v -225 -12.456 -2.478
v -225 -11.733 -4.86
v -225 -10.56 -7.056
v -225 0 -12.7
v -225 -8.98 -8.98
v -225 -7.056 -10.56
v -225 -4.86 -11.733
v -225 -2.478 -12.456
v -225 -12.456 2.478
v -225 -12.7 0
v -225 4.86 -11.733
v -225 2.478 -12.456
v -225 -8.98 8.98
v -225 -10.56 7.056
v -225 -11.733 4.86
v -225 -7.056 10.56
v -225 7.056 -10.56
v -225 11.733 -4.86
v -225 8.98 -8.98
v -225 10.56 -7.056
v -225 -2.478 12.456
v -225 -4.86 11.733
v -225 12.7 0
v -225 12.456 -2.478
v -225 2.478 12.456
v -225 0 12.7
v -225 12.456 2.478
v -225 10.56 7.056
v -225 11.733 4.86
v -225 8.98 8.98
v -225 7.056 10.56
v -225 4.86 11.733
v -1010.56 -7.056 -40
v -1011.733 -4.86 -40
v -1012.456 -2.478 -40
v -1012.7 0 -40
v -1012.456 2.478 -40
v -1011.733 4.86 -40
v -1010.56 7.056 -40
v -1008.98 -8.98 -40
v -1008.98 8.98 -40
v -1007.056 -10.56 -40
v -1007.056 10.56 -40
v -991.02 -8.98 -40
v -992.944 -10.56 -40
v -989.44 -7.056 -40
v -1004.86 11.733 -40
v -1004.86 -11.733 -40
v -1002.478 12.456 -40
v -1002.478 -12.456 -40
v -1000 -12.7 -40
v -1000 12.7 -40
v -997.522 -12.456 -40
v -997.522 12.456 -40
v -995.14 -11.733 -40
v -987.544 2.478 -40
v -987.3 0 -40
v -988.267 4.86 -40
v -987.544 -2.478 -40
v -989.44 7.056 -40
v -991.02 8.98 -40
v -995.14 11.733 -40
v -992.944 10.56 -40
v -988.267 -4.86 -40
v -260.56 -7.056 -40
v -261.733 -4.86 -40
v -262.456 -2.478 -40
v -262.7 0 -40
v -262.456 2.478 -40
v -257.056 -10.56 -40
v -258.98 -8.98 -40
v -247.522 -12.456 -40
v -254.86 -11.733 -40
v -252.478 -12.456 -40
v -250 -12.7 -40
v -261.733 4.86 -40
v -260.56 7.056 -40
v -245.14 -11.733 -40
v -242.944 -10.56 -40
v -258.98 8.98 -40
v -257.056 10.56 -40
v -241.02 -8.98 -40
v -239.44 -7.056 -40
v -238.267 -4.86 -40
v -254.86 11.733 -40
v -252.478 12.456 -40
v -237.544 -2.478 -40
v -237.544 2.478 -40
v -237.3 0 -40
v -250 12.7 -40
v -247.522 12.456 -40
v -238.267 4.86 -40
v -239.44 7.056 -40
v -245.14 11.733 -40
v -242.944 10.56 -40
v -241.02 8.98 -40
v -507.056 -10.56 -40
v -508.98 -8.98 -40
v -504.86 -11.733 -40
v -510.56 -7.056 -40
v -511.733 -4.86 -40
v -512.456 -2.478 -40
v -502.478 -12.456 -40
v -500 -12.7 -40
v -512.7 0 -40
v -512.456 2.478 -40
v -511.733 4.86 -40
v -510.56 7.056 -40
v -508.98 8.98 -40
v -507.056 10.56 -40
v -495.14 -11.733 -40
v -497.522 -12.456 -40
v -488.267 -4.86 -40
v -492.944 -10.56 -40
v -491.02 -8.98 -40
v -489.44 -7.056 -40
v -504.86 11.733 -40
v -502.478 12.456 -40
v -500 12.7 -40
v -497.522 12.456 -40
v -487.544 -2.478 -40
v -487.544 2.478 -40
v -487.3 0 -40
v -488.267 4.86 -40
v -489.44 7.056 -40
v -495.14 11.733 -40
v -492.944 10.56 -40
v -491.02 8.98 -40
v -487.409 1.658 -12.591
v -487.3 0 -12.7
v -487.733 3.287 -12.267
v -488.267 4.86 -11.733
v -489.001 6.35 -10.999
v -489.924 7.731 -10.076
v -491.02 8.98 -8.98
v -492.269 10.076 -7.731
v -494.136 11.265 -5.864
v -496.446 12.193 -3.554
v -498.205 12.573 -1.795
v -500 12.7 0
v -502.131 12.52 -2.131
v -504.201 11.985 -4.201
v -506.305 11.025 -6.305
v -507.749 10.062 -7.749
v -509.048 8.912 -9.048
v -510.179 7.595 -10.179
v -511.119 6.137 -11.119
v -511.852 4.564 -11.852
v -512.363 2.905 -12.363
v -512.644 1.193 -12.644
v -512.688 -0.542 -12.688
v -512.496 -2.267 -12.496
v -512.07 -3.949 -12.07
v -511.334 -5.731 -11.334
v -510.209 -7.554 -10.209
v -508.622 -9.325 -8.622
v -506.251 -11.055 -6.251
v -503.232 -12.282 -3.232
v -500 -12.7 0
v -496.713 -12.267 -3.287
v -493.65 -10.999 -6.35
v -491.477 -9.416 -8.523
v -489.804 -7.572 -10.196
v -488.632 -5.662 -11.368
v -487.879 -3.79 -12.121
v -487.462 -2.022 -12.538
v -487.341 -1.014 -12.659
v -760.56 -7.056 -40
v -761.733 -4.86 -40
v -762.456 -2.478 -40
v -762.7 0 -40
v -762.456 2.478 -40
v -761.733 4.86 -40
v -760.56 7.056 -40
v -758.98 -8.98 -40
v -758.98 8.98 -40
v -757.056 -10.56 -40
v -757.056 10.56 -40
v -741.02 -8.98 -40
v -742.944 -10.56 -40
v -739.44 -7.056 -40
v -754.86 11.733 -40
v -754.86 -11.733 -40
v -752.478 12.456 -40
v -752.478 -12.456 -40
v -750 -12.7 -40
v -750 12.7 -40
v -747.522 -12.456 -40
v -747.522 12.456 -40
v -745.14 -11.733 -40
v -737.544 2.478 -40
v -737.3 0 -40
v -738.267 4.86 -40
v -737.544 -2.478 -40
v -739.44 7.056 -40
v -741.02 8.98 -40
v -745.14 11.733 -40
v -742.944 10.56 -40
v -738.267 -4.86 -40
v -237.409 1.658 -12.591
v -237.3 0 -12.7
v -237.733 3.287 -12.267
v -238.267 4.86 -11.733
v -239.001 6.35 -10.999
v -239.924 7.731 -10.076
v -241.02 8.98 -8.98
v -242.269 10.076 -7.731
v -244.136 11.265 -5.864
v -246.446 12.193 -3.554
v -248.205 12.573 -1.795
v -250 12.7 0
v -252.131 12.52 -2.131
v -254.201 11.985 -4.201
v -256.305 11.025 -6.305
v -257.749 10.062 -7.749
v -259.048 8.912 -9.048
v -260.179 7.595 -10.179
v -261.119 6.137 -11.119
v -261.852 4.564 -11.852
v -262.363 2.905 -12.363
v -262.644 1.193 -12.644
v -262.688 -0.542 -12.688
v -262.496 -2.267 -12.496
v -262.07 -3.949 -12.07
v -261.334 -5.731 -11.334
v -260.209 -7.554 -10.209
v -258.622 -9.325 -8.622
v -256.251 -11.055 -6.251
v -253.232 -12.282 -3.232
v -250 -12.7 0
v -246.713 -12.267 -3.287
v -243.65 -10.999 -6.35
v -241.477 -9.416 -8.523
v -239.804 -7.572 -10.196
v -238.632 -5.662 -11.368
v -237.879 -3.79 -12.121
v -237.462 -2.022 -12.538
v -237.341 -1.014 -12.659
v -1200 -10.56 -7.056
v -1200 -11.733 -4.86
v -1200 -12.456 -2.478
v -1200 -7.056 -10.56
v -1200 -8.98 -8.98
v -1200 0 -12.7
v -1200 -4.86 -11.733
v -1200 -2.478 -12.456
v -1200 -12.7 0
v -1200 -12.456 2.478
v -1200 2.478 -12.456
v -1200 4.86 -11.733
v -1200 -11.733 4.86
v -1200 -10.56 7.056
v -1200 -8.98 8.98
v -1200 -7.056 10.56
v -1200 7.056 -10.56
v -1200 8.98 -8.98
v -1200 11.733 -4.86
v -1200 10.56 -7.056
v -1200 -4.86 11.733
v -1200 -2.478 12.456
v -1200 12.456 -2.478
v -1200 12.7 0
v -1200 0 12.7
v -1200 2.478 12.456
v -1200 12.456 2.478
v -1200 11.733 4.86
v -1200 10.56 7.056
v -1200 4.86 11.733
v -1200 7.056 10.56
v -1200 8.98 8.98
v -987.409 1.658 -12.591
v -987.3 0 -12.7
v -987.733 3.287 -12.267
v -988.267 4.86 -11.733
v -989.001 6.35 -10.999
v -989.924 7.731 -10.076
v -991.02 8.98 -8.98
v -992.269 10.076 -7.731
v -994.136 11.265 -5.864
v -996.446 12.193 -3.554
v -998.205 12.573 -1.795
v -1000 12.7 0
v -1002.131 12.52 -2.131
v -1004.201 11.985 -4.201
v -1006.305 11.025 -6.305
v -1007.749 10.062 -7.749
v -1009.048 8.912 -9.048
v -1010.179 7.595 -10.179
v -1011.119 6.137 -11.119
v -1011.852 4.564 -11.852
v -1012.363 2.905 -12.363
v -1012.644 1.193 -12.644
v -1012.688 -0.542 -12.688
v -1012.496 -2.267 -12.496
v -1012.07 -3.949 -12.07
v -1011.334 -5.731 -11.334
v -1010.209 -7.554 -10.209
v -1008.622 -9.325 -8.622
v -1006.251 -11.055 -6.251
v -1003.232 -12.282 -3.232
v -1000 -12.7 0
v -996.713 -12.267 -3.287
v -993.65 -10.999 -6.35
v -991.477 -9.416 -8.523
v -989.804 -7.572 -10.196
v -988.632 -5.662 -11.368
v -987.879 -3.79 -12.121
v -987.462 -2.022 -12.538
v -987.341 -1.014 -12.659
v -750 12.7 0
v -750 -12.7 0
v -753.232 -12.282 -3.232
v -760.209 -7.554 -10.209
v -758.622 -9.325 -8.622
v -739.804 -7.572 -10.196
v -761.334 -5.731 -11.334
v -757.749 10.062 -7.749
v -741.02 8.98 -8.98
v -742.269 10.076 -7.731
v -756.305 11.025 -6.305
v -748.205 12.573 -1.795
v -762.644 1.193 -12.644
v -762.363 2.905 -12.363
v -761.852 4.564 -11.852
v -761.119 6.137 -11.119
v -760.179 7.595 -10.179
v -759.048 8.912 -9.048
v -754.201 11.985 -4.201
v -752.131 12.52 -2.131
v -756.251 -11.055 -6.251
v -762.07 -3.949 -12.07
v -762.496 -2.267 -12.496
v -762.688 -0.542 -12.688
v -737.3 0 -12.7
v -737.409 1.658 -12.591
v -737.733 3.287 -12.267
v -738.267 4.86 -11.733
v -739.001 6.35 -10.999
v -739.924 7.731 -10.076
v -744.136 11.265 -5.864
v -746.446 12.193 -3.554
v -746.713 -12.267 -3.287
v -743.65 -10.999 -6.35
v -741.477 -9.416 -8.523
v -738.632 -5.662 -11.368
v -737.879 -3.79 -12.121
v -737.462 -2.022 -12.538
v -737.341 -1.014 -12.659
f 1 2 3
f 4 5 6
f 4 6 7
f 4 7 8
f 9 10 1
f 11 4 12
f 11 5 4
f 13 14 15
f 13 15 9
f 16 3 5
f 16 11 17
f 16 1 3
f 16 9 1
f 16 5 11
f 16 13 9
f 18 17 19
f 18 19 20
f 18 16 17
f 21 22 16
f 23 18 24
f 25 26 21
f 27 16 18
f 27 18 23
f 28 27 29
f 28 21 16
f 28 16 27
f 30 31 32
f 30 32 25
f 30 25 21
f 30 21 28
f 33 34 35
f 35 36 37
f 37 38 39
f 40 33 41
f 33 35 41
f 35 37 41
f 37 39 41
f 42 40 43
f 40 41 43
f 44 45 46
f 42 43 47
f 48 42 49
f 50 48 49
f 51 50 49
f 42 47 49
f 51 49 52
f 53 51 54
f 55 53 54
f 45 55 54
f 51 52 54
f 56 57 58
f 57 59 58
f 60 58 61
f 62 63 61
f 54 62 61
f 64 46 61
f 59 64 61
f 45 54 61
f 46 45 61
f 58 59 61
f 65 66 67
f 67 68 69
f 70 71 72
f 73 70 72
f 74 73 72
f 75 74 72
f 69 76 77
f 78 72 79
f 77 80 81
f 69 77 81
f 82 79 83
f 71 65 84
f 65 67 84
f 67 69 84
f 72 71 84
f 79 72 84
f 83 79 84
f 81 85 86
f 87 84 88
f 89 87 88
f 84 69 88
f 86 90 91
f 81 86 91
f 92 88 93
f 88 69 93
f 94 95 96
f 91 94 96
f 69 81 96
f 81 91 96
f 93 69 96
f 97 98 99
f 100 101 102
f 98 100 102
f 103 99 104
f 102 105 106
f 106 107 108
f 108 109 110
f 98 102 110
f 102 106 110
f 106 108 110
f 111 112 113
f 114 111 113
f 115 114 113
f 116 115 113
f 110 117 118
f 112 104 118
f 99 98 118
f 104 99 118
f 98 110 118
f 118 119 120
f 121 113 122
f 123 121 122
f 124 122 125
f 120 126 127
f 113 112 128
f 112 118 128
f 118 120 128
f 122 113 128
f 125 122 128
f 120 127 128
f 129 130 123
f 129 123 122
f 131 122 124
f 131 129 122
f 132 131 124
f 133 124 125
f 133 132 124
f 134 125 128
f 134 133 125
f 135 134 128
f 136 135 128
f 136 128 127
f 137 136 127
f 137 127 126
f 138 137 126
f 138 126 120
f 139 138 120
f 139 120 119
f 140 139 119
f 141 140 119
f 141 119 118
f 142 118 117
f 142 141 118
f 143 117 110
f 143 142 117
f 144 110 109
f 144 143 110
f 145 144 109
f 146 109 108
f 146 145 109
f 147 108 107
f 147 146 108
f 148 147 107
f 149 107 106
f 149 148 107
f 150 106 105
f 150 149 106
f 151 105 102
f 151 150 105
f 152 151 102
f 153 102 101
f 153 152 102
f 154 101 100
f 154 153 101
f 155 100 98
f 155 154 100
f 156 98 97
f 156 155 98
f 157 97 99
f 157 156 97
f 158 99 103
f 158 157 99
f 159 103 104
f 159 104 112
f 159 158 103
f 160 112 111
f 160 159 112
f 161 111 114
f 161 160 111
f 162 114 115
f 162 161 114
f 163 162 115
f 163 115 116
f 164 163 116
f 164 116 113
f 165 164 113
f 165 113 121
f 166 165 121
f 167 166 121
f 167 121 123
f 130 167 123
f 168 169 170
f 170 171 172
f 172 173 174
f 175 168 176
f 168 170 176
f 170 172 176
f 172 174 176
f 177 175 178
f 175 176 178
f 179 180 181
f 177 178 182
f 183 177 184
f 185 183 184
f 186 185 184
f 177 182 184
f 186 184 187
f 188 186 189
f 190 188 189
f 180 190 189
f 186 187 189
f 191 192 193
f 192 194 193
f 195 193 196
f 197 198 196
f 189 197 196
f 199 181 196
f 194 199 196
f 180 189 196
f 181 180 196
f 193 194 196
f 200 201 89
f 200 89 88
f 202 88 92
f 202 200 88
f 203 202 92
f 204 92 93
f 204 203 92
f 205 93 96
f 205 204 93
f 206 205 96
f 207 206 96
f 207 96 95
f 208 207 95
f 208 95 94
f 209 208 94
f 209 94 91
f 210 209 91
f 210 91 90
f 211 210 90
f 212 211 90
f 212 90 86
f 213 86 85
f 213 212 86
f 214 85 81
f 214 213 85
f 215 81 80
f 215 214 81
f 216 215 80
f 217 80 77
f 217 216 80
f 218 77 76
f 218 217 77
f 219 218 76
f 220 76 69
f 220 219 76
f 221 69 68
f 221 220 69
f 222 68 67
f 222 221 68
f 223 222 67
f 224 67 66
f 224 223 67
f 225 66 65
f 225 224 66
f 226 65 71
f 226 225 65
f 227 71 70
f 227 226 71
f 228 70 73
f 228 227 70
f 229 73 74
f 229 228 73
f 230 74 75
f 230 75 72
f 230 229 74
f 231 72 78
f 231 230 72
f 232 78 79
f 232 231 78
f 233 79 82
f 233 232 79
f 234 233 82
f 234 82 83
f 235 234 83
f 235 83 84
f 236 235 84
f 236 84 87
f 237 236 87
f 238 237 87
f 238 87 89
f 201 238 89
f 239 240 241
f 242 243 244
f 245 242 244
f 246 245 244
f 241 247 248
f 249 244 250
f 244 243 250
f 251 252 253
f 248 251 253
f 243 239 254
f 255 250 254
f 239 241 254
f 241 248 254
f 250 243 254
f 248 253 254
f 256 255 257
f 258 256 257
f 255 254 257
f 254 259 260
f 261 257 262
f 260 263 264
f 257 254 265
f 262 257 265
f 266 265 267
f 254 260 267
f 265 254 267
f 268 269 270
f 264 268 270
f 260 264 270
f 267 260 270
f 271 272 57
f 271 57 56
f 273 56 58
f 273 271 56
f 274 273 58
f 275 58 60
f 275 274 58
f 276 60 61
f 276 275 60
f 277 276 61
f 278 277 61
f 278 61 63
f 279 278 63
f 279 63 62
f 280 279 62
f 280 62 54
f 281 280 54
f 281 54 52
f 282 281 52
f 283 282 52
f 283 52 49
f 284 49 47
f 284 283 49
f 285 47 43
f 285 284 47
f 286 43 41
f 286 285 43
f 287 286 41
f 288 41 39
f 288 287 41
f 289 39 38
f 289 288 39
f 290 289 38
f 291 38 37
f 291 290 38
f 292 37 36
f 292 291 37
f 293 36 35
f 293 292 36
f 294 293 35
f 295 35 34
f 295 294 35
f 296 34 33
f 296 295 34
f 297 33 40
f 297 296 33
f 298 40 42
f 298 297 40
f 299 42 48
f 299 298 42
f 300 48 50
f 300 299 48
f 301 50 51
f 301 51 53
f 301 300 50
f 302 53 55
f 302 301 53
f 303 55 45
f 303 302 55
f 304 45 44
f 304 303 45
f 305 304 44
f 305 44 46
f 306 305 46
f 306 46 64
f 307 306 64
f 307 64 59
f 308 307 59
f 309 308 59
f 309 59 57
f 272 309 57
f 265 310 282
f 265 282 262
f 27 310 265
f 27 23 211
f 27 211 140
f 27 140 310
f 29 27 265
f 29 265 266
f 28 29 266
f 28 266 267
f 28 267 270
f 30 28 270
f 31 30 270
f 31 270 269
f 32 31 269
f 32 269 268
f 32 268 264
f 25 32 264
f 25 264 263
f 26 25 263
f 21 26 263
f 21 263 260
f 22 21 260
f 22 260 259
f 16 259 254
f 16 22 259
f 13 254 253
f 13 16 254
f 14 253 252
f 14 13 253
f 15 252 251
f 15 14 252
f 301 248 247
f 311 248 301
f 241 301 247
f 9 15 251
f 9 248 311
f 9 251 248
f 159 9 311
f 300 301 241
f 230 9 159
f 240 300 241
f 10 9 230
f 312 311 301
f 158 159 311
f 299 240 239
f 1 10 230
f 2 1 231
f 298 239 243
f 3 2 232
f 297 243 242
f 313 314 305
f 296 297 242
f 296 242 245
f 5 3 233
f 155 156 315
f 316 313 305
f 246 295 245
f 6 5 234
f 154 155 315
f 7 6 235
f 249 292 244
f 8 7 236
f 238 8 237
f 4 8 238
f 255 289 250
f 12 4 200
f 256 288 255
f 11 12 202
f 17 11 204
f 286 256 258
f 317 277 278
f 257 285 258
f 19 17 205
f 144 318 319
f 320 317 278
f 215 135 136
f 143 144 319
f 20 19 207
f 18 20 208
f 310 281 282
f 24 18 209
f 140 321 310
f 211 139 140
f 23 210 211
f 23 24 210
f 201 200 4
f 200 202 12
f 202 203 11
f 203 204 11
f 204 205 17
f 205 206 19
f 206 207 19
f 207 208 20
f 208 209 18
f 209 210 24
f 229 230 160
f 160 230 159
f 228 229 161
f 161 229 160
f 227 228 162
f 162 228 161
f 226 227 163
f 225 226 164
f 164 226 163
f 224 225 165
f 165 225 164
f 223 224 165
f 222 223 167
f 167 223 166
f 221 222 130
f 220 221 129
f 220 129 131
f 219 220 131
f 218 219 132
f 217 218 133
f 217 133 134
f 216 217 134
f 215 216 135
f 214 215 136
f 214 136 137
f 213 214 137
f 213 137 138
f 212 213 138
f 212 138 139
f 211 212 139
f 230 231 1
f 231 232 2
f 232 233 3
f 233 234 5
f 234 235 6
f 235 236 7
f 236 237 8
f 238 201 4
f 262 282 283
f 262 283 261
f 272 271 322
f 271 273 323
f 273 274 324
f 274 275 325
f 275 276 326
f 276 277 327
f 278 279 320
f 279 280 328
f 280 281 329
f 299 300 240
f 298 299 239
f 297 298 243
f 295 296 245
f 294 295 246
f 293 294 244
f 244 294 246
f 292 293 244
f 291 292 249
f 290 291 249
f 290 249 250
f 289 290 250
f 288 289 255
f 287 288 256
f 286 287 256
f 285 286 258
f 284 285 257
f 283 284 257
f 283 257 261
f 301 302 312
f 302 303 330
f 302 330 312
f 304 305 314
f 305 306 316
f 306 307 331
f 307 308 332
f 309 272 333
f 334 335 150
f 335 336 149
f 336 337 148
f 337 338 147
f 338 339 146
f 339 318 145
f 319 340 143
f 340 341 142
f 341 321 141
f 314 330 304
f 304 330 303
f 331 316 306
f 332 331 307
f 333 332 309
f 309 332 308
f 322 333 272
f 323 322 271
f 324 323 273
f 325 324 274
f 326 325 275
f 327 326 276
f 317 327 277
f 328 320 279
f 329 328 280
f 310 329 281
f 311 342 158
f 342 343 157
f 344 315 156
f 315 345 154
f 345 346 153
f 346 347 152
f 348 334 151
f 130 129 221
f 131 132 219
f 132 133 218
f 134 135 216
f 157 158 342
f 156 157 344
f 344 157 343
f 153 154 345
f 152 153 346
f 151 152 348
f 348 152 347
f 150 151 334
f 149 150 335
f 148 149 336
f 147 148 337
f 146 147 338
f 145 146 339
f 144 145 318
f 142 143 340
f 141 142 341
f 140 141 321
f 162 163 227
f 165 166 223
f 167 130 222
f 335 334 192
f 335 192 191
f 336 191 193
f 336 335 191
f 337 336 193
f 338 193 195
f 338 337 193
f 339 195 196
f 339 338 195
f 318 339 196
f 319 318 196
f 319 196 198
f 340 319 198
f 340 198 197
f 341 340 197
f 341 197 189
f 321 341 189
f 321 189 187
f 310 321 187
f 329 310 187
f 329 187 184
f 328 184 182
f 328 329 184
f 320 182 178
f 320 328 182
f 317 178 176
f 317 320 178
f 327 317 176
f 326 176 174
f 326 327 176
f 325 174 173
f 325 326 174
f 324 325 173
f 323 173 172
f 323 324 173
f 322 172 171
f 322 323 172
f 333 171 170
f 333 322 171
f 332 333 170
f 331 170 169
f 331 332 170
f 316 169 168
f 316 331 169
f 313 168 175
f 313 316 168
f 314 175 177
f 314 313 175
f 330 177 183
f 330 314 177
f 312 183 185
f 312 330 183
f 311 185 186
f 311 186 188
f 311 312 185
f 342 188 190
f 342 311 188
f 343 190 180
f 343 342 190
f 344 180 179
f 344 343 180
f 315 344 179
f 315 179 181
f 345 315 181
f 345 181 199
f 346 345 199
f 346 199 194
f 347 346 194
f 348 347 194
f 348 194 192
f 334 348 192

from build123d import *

# Parameters (mm, degrees)
F0_R      = 12.7
F1_DEPTH  = 1200
F2_R      = 12.7
F3_DEPTH  = 40
F1_FACE_R = 12.7
F4_DEPTH  = 225


with BuildPart() as f1:
    # F0 (on Right) → F1 (new body)
    with BuildSketch(Plane.YZ):
        Circle(F0_R)
    extrude(amount=-F1_DEPTH)

    # F2 (on Top) → F3 (join)
    with BuildSketch(Plane.XY):
        with Locations((-250, 0)):
            Circle(F2_R)
        with Locations((-500, 0)):
            Circle(F2_R)
        with Locations((-750, 0)):
            Circle(F2_R)
        with Locations((-1000, 0)):
            Circle(F2_R)
    extrude(amount=-F3_DEPTH)

    # F1_face (on face) → F4 (cut)
    with BuildSketch(Plane.YZ):
        Circle(F1_FACE_R)
    extrude(amount=-F4_DEPTH, mode=Mode.SUBTRACT)


solid = f1.part
